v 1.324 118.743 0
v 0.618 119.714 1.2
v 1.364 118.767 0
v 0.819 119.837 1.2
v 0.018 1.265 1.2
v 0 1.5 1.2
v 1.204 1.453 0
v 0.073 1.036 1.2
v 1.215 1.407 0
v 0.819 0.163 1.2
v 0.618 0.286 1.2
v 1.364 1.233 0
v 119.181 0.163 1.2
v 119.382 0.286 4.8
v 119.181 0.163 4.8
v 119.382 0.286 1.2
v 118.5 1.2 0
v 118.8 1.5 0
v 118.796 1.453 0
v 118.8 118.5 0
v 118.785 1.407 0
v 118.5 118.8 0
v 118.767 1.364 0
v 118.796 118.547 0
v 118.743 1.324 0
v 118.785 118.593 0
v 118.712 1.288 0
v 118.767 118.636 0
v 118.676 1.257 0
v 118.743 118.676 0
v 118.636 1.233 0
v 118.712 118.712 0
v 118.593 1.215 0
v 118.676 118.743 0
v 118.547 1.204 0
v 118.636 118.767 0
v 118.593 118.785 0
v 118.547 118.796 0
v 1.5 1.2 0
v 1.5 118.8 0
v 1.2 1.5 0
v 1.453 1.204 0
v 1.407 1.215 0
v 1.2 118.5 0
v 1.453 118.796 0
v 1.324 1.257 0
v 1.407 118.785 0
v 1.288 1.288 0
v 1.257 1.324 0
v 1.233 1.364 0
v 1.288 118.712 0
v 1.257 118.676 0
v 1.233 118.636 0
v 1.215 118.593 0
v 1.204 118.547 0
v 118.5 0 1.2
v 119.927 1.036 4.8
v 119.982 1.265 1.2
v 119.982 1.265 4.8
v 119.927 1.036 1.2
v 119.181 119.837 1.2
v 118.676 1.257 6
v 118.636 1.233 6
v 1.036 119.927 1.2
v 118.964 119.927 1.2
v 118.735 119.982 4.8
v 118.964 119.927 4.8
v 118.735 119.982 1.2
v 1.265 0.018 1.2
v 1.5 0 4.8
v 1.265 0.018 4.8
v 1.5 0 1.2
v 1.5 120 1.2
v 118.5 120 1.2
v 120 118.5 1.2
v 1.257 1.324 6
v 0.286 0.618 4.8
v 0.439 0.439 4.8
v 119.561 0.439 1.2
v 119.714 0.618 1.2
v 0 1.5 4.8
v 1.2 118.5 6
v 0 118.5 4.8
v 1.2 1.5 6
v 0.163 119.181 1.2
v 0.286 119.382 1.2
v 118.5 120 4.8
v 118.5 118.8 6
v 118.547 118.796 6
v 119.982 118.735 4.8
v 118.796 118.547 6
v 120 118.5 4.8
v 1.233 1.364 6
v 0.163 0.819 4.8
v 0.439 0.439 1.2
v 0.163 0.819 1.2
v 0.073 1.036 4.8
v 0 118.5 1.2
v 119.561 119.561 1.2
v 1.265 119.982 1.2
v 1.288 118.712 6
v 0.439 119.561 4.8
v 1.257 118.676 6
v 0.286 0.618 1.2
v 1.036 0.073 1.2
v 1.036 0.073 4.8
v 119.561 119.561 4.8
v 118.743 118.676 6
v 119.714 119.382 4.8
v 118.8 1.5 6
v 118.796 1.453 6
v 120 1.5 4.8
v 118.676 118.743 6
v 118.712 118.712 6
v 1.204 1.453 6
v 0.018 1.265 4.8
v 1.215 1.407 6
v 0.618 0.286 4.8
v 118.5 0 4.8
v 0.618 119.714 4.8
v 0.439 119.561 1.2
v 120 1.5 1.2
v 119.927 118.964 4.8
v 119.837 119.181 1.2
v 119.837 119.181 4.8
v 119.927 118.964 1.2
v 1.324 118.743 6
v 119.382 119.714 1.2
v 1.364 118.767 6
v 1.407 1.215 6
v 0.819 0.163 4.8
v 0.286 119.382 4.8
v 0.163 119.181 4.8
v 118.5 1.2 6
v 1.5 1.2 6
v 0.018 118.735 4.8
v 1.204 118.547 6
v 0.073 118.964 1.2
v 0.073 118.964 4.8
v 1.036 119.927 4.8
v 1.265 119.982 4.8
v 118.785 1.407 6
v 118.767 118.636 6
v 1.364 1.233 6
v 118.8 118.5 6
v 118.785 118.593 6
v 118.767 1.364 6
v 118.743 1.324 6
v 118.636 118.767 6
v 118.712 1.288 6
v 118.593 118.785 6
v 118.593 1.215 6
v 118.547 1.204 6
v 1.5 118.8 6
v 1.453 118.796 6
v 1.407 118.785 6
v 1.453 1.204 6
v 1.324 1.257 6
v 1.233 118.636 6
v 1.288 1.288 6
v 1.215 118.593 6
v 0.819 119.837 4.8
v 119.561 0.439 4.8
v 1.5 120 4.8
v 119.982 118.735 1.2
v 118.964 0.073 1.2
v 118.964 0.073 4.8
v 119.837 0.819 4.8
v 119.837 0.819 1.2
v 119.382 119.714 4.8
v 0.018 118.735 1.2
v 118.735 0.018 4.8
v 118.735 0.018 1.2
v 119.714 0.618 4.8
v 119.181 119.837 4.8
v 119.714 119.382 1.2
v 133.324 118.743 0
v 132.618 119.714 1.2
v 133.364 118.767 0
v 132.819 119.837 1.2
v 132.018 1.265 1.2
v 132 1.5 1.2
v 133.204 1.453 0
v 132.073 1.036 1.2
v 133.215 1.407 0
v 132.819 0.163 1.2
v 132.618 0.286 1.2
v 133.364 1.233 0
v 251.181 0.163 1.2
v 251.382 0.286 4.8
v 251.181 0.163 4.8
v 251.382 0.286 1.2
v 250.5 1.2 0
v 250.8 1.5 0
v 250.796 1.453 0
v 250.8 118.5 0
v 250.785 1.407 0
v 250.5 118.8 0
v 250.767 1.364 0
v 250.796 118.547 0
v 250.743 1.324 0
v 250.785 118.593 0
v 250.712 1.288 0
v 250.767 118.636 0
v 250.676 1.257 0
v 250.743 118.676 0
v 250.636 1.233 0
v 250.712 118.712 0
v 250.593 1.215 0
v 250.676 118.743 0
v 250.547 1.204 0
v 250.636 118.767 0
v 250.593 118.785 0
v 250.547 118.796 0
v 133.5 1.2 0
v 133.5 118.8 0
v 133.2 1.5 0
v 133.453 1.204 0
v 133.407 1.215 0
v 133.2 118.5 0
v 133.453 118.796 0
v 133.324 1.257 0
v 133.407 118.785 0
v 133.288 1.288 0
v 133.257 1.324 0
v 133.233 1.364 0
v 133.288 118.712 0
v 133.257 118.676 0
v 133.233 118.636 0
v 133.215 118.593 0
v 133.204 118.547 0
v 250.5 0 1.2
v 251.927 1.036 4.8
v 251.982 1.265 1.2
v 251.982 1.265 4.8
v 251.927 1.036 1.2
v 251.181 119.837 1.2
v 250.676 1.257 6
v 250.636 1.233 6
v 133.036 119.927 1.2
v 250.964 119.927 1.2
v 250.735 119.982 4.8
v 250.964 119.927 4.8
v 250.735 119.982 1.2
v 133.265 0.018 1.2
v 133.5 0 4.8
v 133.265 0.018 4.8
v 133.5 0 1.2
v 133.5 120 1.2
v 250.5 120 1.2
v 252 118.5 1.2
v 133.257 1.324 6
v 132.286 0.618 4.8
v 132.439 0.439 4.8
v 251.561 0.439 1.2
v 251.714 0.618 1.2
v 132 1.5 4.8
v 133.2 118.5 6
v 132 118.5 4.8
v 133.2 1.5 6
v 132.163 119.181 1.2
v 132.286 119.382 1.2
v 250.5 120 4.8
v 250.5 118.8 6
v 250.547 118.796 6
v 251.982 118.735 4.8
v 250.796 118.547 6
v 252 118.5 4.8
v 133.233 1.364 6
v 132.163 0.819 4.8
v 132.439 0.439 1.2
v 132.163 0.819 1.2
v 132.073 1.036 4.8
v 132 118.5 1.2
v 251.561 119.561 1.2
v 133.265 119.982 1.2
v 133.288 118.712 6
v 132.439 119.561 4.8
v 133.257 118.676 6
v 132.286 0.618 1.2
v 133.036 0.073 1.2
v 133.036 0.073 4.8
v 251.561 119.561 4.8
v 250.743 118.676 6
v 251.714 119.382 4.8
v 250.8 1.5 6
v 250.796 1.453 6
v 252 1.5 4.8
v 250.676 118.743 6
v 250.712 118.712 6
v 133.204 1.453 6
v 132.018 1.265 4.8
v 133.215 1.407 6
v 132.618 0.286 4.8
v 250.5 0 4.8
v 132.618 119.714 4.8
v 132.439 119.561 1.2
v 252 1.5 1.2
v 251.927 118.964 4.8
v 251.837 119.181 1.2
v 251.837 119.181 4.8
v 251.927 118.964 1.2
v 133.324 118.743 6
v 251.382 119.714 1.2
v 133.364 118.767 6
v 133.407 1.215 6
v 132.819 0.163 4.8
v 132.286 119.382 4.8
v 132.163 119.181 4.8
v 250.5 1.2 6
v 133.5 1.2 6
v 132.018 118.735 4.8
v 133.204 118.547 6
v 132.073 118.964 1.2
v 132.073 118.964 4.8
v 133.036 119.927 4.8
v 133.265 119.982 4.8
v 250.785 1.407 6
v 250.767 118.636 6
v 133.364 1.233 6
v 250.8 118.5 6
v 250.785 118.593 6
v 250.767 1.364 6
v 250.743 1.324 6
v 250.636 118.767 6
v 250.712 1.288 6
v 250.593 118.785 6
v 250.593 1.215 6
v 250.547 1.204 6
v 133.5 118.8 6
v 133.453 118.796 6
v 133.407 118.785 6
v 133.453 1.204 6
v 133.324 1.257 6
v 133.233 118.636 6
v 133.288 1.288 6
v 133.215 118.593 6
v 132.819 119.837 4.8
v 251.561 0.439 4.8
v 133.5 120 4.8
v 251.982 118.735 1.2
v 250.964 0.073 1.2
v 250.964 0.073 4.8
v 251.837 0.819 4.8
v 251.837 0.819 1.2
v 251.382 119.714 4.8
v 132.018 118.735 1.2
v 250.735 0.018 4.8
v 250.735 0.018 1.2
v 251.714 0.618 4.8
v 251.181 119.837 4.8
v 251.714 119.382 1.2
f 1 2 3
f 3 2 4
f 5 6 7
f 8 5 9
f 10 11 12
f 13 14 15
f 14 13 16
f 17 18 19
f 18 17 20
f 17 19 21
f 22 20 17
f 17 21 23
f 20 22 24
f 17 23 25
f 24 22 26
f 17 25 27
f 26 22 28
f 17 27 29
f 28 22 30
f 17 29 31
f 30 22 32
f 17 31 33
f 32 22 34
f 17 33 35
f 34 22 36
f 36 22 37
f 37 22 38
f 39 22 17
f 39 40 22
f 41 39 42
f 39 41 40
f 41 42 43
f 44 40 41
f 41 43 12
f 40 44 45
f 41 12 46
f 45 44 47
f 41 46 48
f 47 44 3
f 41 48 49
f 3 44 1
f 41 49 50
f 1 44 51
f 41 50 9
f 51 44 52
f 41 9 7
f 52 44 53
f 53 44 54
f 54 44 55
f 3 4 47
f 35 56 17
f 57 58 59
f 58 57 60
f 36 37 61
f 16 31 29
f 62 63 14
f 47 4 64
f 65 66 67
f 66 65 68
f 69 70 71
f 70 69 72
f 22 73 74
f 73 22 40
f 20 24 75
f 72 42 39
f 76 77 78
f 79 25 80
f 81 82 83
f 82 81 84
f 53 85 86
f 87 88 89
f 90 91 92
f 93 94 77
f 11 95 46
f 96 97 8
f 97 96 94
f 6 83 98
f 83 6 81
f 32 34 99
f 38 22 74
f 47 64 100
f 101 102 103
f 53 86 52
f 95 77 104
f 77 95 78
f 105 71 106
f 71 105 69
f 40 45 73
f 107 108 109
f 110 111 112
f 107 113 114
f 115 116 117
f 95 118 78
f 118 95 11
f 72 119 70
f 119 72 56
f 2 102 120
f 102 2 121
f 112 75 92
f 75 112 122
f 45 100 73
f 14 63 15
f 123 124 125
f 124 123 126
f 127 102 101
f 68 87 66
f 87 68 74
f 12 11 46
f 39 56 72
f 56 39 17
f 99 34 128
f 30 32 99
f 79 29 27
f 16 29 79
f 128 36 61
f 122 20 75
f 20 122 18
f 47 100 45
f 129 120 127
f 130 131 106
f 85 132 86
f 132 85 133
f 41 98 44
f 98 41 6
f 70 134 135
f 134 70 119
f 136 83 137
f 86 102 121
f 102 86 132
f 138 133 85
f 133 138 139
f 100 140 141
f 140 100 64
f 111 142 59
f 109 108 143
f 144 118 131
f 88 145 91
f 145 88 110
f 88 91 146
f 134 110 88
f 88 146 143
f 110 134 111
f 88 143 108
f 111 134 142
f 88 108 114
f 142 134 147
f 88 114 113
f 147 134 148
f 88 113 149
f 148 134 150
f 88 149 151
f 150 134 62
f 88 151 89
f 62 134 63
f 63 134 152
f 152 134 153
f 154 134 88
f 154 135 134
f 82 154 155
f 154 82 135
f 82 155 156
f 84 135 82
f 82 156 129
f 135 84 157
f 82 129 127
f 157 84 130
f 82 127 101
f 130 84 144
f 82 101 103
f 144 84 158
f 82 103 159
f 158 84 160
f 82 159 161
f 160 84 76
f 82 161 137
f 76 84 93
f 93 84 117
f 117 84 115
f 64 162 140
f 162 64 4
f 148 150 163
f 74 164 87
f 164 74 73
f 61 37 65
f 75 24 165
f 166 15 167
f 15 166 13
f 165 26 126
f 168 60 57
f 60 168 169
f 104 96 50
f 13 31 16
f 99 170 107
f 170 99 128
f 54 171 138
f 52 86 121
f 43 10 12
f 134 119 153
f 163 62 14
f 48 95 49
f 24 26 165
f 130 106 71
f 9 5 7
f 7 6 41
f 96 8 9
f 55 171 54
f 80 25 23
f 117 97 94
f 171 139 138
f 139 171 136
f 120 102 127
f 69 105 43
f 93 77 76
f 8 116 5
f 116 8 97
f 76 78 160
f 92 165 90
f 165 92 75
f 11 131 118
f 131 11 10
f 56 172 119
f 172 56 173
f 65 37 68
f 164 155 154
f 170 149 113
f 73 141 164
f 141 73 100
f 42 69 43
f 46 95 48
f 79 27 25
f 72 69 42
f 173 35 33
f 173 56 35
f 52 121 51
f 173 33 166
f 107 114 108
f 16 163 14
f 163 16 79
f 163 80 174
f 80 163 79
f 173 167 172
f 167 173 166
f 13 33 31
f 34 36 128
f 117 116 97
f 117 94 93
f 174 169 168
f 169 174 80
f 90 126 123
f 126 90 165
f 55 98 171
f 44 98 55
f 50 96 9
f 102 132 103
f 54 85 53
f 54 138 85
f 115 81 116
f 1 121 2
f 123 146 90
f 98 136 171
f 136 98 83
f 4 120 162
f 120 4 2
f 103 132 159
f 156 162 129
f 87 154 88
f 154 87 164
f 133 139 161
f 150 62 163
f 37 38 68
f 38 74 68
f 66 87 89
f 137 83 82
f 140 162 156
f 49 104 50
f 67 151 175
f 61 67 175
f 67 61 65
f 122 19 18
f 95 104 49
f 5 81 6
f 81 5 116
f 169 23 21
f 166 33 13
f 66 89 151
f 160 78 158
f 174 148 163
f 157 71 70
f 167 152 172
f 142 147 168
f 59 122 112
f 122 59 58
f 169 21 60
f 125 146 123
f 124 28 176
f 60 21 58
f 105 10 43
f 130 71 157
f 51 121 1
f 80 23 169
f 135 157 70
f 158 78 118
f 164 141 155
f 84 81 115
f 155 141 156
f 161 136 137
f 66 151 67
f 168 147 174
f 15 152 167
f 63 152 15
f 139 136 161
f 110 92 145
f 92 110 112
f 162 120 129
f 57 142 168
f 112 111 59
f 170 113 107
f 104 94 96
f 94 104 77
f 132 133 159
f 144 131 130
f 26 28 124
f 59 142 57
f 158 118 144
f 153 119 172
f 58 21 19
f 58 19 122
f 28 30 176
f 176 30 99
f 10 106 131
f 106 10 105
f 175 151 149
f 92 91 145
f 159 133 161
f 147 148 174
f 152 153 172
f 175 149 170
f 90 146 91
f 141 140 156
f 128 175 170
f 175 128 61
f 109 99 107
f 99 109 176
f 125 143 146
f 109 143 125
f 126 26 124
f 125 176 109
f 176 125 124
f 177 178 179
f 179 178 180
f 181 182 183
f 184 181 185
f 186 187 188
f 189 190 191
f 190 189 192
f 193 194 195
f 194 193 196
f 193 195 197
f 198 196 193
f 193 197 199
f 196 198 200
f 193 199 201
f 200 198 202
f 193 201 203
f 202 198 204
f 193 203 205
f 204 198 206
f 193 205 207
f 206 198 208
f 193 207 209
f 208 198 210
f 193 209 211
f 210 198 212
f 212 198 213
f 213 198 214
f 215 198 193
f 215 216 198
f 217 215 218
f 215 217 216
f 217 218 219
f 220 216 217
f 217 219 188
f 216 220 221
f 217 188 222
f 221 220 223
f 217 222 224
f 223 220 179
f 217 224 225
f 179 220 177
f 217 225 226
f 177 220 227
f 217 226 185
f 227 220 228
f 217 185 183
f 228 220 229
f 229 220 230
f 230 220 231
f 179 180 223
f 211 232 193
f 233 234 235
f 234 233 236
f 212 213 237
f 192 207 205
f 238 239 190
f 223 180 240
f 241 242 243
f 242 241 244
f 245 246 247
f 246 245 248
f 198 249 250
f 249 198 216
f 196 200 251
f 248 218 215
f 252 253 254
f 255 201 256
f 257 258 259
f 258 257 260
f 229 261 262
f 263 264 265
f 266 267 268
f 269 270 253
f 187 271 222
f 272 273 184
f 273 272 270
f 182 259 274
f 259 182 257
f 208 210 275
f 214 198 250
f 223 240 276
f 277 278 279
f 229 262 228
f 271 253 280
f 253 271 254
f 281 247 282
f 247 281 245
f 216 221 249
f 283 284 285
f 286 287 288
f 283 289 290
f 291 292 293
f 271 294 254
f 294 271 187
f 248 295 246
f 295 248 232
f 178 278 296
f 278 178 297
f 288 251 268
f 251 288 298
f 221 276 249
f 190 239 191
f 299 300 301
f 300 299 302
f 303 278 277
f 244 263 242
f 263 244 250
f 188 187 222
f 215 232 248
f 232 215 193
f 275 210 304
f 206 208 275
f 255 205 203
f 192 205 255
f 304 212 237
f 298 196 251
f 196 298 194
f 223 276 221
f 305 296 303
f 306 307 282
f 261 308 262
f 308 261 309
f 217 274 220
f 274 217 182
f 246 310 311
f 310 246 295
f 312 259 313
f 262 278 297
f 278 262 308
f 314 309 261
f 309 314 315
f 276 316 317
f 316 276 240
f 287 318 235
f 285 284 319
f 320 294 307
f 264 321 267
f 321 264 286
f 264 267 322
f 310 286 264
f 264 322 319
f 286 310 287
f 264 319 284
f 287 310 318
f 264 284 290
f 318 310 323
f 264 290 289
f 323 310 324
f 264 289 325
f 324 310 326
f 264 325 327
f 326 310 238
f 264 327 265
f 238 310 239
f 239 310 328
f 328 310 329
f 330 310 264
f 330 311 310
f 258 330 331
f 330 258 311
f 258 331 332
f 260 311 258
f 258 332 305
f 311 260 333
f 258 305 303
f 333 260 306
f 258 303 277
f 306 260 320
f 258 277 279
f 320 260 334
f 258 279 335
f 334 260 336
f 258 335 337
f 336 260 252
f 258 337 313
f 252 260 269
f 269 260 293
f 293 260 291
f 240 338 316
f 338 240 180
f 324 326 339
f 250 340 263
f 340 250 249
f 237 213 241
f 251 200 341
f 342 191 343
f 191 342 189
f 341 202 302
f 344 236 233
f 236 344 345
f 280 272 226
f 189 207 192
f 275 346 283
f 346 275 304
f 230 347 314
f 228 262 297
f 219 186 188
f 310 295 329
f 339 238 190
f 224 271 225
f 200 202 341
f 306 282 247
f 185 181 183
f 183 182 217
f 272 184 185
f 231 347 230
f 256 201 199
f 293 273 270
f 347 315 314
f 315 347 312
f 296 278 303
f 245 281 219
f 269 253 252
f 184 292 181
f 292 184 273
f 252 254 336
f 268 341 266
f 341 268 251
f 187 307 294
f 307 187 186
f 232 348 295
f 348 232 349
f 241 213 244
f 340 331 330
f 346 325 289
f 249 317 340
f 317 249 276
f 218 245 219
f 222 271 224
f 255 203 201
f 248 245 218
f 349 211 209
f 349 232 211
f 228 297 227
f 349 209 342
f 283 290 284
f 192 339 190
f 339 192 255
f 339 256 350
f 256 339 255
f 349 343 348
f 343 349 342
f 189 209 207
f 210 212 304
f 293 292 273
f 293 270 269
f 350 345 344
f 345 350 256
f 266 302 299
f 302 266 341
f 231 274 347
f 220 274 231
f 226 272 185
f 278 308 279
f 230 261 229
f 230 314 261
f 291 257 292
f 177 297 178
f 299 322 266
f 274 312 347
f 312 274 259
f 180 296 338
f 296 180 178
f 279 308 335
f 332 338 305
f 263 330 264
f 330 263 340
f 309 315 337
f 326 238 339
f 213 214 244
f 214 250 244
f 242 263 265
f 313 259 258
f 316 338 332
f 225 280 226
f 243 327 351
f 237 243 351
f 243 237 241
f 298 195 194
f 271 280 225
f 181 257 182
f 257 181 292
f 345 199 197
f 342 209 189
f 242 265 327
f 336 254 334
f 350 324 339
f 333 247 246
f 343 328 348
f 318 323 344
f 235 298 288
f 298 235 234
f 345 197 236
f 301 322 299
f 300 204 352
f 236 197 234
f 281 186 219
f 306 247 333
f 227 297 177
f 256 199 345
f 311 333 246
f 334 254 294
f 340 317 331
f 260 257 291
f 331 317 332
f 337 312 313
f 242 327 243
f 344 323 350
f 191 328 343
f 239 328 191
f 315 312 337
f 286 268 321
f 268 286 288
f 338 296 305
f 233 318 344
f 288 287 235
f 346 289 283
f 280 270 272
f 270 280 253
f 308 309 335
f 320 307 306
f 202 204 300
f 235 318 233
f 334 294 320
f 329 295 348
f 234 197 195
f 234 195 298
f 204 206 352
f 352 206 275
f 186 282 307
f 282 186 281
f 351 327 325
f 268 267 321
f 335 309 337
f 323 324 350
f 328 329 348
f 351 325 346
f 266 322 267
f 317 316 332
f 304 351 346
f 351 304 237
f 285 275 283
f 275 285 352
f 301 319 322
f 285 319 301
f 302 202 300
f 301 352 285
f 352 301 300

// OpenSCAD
// file: ../lib/maker_mark.scad
// SPDX-License-Identifier: MIT
// Copyright (c) 2026 KomaSCAD contributors. https://github.com/Kazutadashi/koma-scad
//
// The maker's mark (銘) of the ban, komadai and komabako. Include this file:
//     include <../lib/maker_mark.scad>
// A mark is up to three parts, stacked and centered: an emblem (a koma with a
// character on it), a main line, and a smaller second line. Each line can
// have wide letter spacing, as in a wordmark.
//
// Sizes: size_1 is the main line's text size and size_2 the second line's,
// in mm. maker_mark_sizes() picks them: as large as the room allows, with no
// text below a printable minimum (min_size).

// The emblem's proportions: a koma 1.6 times the main text size tall, as
// wide as a shogi king is for its length.
mark_emblem_height = 1.6;      // times the main text size
mark_emblem_aspect = 0.89;     // width / height
mark_emblem_shoulder = 0.72;   // the shoulders, as a fraction of the height
mark_emblem_inset = 0.37;      // the half-width at the shoulders, as a fraction of the height
mark_emblem_character = 0.5;   // the character's size, as a fraction of the emblem's height
mark_line_gap = 0.55;          // space between the parts, times the main text size
mark_fill = 0.8;               // an automatic mark uses at most this much of its room

// The approximate width of one character, in text sizes. Text has no
// measured width in OpenSCAD 2021, so the mark's size is planned from these.
// OpenSCAD's text size is about the height of a capital, so a character is
// wider than its size: measured in Shippori Mincho and Kaisei Tokumin, a
// Japanese character (from U+2E80) is about 1.35 wide and 1.3 tall, a Latin
// capital about 1 wide (up to 1.2), lower case 0.75, a space 0.35.
function mark_character_width(character) =
    let(code = ord(character))
    code >= 11904 ? 1.35
    : character == " " ? 0.35
    : code >= 65 && code <= 90 ? 1
    : code >= 97 && code <= 122 ? 0.75
    : 0.5;
function mark_text_width(line, i=0) = i >= len(line) ? 0 : mark_character_width(line[i]) + mark_text_width(line, i + 1);
function maker_mark_has_kanji(line) = len([for (character = line) if (ord(character) >= 11904) 1]) > 0;
// The height of a line, in text sizes: taller with Japanese characters.
function mark_line_height(line) = maker_mark_has_kanji(line) ? 1.35 : 1.1;

// The emblem's height: 1.6 times the main text size, but tall enough that its
// character is at least min_size.
function mark_emblem_size(size_1, min_size) = max(size_1*mark_emblem_height, min_size/mark_emblem_character);

// A koma outline, its heel on y = 0 and centered on x = 0.
module mark_koma_2d(height) {
    half = height*mark_emblem_aspect/2;
    polygon([[-half, 0], [half, 0], [height*mark_emblem_inset, height*mark_emblem_shoulder],
             [0, height], [-height*mark_emblem_inset, height*mark_emblem_shoulder]]);
}

// The 2D mark, centered on the origin at the middle of the main line's
// baseline. Empty lines are left out. stroke thickens every stroke by that
// much on each side, so that thin strokes print. min_size keeps the emblem's
// character at least that size.
module maker_mark_2d(line_1, line_2, size_1, size_2, font_1, font_2, spacing_1=1, spacing_2=1,
                     emblem=false, emblem_character="", emblem_font="", stroke=0, min_size=0) {
    gap = size_1*mark_line_gap;
    if (line_1 != "")
        offset(delta=stroke)
            text(line_1, size=size_1, font=font_1, spacing=spacing_1, halign="center", valign="baseline");
    if (line_2 != "")
        translate([0, -gap]) offset(delta=stroke)
            text(line_2, size=size_2, font=font_2, spacing=spacing_2, halign="center", valign="top");
    if (emblem) {
        height = mark_emblem_size(size_1, min_size);
        // The main line's capitals stand about one text size above the baseline.
        translate([0, size_1 + gap]) difference() {
            mark_koma_2d(height);
            if (emblem_character != "")
                translate([0, height*0.42]) offset(delta=stroke)
                    text(emblem_character, size=height*mark_emblem_character,
                         font=emblem_font == "" ? font_1 : emblem_font, halign="center", valign="center");
        }
    }
}

// The space above and below the main line's baseline. Letters stand about
// 1.1 sizes above it and reach about 0.2 below.
function mark_above(size_1, emblem, min_size=0) =
    size_1*1.1 + (emblem ? size_1*mark_line_gap + mark_emblem_size(size_1, min_size) : 0);
function mark_below(line_2, size_1, size_2) =
    size_1*0.2 + (line_2 == "" ? 0 : size_1*mark_line_gap + size_2*mark_line_height(line_2));

// The same mark, with its whole height centered on the origin.
module maker_mark_centered_2d(line_1, line_2, size_1, size_2, font_1, font_2, spacing_1=1, spacing_2=1,
                              emblem=false, emblem_character="", emblem_font="", stroke=0, min_size=0) {
    translate([0, (mark_below(line_2, size_1, size_2) - mark_above(size_1, emblem, min_size))/2])
        maker_mark_2d(line_1, line_2, size_1, size_2, font_1, font_2, spacing_1, spacing_2,
                      emblem, emblem_character, emblem_font, stroke, min_size);
}

// The mark's approximate [width, height] in mm, for fit checks.
function maker_mark_extent(line_1, line_2, size_1, size_2, spacing_1=1, spacing_2=1, emblem=false, min_size=0) =
    [max(mark_text_width(line_1)*size_1*spacing_1, mark_text_width(line_2)*size_2*spacing_2,
         emblem ? mark_emblem_size(size_1, min_size)*mark_emblem_aspect : 0),
     mark_above(size_1, emblem, min_size) + mark_below(line_2, size_1, size_2)];

// The text sizes [size_1, size_2] of a mark. size > 0 sets the main line;
// size = 0 makes it as large as fits mark_fill of room ([width, depth]), up to
// max_size. The second line is ratio times the main line, but never smaller
// than min_size.
function maker_mark_sizes(line_1, line_2, size, ratio, min_size, max_size, spacing_1, spacing_2, emblem, room) =
    let(width_1 = mark_text_width(line_1)*spacing_1,
        width_2 = mark_text_width(line_2)*spacing_2*ratio,
        height = 1.3 + (emblem ? mark_line_gap + mark_emblem_height : 0)
                 + (line_2 == "" ? 0 : mark_line_gap + ratio*mark_line_height(line_2)),
        by_width = room[0]*mark_fill/max(width_1, width_2, emblem ? mark_emblem_height*mark_emblem_aspect : 0, 0.01),
        by_height = room[1]*mark_fill/height,
        size_1 = size > 0 ? size : min(max_size, by_width, by_height),
        size_2 = max(size_1*ratio, min_size))
    [size_1, size_2];

// The size of the smallest text in the lines, or a large number when both are
// empty. The emblem's character grows to min_size by itself.
function maker_mark_smallest_text(line_1, line_2, sizes) =
    min(concat(line_1 != "" ? [sizes[0]] : [], line_2 != "" ? [sizes[1]] : [], [1000]));
// file: ../lib/shapes.scad
// SPDX-License-Identifier: MIT
// Copyright (c) 2026 KomaSCAD contributors. https://github.com/Kazutadashi/koma-scad
//
// Rounded slabs and rings for the ban, komadai and komabako. Include this file:
//     include <../lib/shapes.scad>
// Every shape starts at the origin and grows into +x, +y and +z.

// A rectangle with rounded corners. The radius is limited to half the shorter side.
module rounded_rectangle_2d(size, radius) {
    assert(min(size) > 0, "A rounded rectangle needs a positive width and depth.");
    assert(radius >= 0, "A corner radius cannot be negative.");
    corner = min(radius, min(size)/2);
    if (corner == 0) square(size);
    else translate([corner, corner]) offset(r=corner) square([size[0] - 2*corner, size[1] - 2*corner]);
}

// A slab with rounded vertical corners. size is [width, depth, height].
module rounded_slab(size, radius) {
    assert(size[2] > 0, "A rounded slab needs a positive height.");
    linear_extrude(size[2]) rounded_rectangle_2d([size[0], size[1]], radius);
}

// A rounded slab with a 45 degree chamfer (面取り) round its bottom and top
// edges. A chamfer prints without supports on the bed side of a part.
module chamfered_slab(size, radius, bottom=0, top=0) {
    assert(bottom + top < size[2], "The chamfers are taller than the slab.");
    module layer(z, inset, height) {
        translate([inset, inset, z])
            rounded_slab([size[0] - 2*inset, size[1] - 2*inset, height], max(0, radius - inset));
    }
    thin = 0.01;
    hull() {
        layer(0, bottom, thin);
        layer(bottom, 0, size[2] - bottom - top);
        layer(size[2] - thin, top, thin);
    }
}

// The band between a rounded rectangle and the same shape wall mm smaller on each side.
module rounded_ring_2d(size, wall, radius) {
    assert(wall > 0 && 2*wall < min(size), "The ring wall does not fit inside the ring.");
    difference() {
        rounded_rectangle_2d(size, radius);
        translate([wall, wall]) rounded_rectangle_2d([size[0] - 2*wall, size[1] - 2*wall], max(0, radius - wall));
    }
}
// file: ../lib/filaments.scad
// SPDX-License-Identifier: MIT
// Copyright (c) 2026 KomaSCAD contributors. https://github.com/Kazutadashi/koma-scad
//
// The named filaments of every module. Include this file:
//     include <../lib/filaments.scad>
// A Customizer list of filaments must name these entries, and can add Custom.

// [name, [red, green, blue, opacity]], each channel from 0 to 1.
filament_palette = [
    ["Wood", [0.76, 0.58, 0.34, 1]],   ["Black", [0.08, 0.06, 0.04, 1]],
    ["White", [0.95, 0.95, 0.95, 1]],  ["Red", [0.65, 0.05, 0.04, 1]],
    ["Blue", [0.08, 0.25, 0.8, 1]],    ["Green", [0.08, 0.5, 0.2, 1]],
    ["Purple", [0.45, 0.15, 0.65, 1]], ["Yellow", [0.95, 0.8, 0.08, 1]],
    ["Orange", [0.95, 0.35, 0.05, 1]], ["Silver", [0.7, 0.72, 0.75, 1]],
    ["Gold", [0.8, 0.62, 0.2, 1]],     ["Glitter silver", [0.7, 0.72, 0.75, 1]],
    ["Glitter gold", [0.8, 0.62, 0.2, 1]],
    ["Filament 1", [0.5, 0.5, 0.5, 1]], ["Filament 2", [0.15, 0.5, 0.85, 1]], ["Filament 3", [0.85, 0.25, 0.5, 1]],
    // The colors of the traditional woods: kaya (榧) for boards and komadai, island
    // mulberry (桑) and black persimmon (黒柿) for boxes. Colors only: no grain.
    ["Kaya", [0.86, 0.72, 0.47, 1]],   ["Kuwa", [0.66, 0.45, 0.23, 1]],
    ["Kurogaki", [0.23, 0.18, 0.14, 1]]
];

// The color of a named filament. Custom gives custom_rgba.
function filament_rgba(name, custom_rgba) =
    let(found = [for (entry = filament_palette) if (entry[0] == name) entry[1]])
    name == "Custom" ? custom_rgba
    : assert(len(found) == 1, str("Unknown filament: ", name)) found[0];
// main file
// SPDX-License-Identifier: MIT
// Copyright (c) 2026 KomaSCAD contributors. https://github.com/Kazutadashi/koma-scad
//
// KomaSCAD komadai: a stand for captured pieces. Tested with OpenSCAD 2021.01.
// The default settings make a pair of flat komadai for a 12 mm tabletop board.
// Units are mm unless a comment says otherwise.
// Guide and every setting: docs/komadai.md.
// Keep ../lib/ next to this file's folder.

/* [01 - Start here] */
// Display shows the pair standing, as on the table. One to print and Pair to print turn them top face down for the bed.
Output_Mode = "Display"; // [Display,One to print,Pair to print]
// Flat: a plate beside a tabletop board. Yagura: a top on four legs. One leg: a top on a column and foot. Use the legged styles beside a legged board.
Table_Style = "Flat"; // [Flat,Yagura,One leg]

/* [02 - Board and pieces] */
// mm. Height of the board's playing surface above the table. 12 = the bundled tabletop board.
Board_Surface_Height = 12; // [4:0.5:400]
// mm. Yagura and One leg: how far the top sits below the playing surface. Tradition: 10 to 20.
Height_Below_Board = 15; // [5:0.5:40]
// mm. Length of the largest piece, from the heel to the point. The automatic top size follows it.
Piece_Length = 32; // [10:0.1:100]
// mm. Width of the largest piece at the heel.
Base_Width = 28.5; // [10:0.1:100]

/* [03 - Top] */
// mm. Width of the top. 0 = automatic: about 120 for the bundled pieces.
Top_Width = 0; // [0:1:300]
// mm. Depth of the top. 0 = automatic.
Top_Depth = 0; // [0:1:300]
// mm. Flat only: thickness of the plate. Keep it below the board surface.
Flat_Thickness = 6; // [2:0.5:40]
// mm. Yagura and One leg: thickness of the top.
Top_Thickness = 12; // [4:0.5:40]
// mm. Radius of the four corners.
Corner_Radius = 1.5; // [0:0.5:20]
// mm. 45 degree chamfer (面取り) round the top and bottom edges of the top.
Edge_Chamfer = 1.2; // [0:0.1:4]
// A thin groove inside the edge of the top. Tradition: plain.
Surface_Border_Groove = false;
// mm. Distance from the edge to the groove.
Groove_Inset = 7; // [2:0.5:20]
// mm. Width of the groove.
Groove_Width = 0.9; // [0.3:0.1:2]
// mm. Depth of the groove.
Groove_Depth = 0.4; // [0.1:0.1:1.5]

/* [04 - Legs] */
// mm. Yagura: width of each square leg at the top.
Leg_Width = 16; // [8:0.5:40]
// Yagura: width of each leg at the foot, as a fraction of its width at the top.
Leg_Taper = 0.85; // [0.5:0.01:1]
// mm. Yagura: distance from the edge of the top to each leg.
Leg_Inset = 8; // [0:0.5:40]
// Yagura: stretchers (貫, nuki) that tie the legs together near the foot. They make the stand stiffer.
Stretchers = true;
// mm. Yagura: height of the stretchers above the table.
Stretcher_Height = 30; // [5:1:200]
// One leg: width of the column under the top, as a fraction of the top.
Column_Top_Ratio = 0.3; // [0.15:0.01:0.6]
// One leg: width of the column at the foot, as a fraction of the top.
Column_Bottom_Ratio = 0.36; // [0.15:0.01:0.6]
// One leg: width of the foot, as a fraction of the top.
Foot_Size_Ratio = 0.8; // [0.4:0.01:1]
// mm. One leg: thickness of the foot plate.
Foot_Thickness = 8; // [3:0.5:20]

/* [05 - Maker's mark] */
// The main line of the mark (銘), cut into the underside of the top: your name or brand. Empty = no mark.
Mark_Line_1 = "";
// A smaller line under it, such as SHOGI · 将棋. Empty = none.
Mark_Line_2 = "";
// mm. Text size of the main line. The second line and the emblem follow it. 0 = automatic: as large as the room allows, up to Mark Max Size.
Mark_Size = 0; // [0:0.1:40]
// mm. Automatic only: the largest text size of the main line.
Mark_Max_Size = 14; // [4:0.5:40]
// Size of the second line, as a fraction of the main line. Keep Japanese characters 3 mm or larger.
Mark_Line_2_Ratio = 0.42; // [0.2:0.01:1]
// mm. Smallest size of any text in the mark, and of the emblem's character, so that it prints. The second line and the emblem grow to it. See docs/makers-mark.md for measured values.
Mark_Min_Text_Size = 7; // [3:0.5:20]
// mm. Thickens every stroke of the mark by this much on each side, so that thin strokes print. 0.12 for a thin Mincho.
Mark_Stroke = 0; // [0:0.01:0.3]
// Letter spacing of the main line: each letter's width times this. Raise it if letters run together: a gap narrower than one printed line does not print, and the letters merge. 1.1 clears it for most fonts. About 1.7 gives a wide-spaced wordmark.
Mark_Spacing_1 = 1.1; // [0.8:0.05:3]
// Letter spacing of the second line. Raise it if letters run together.
Mark_Spacing_2 = 1.1; // [0.8:0.05:3]
// An installed font for the main line. Find its exact name in Help > Font List.
Mark_Font_1 = "Kaisei Tokumin:style=ExtraBold";
// An installed font for the second line. Use one with Japanese characters for Japanese text.
Mark_Font_2 = "Kaisei Tokumin:style=ExtraBold";
// A koma above the text, with a character cut into it.
Mark_Emblem = false;
// The character on the emblem, such as 王.
Mark_Emblem_Character = "";
// An installed font for the emblem's character, such as a brush font. Empty = Mark Font 1.
Mark_Emblem_Font = "";
// mm. Depth of the mark.
Mark_Depth = 0.4; // [0.2:0.1:1]

/* [06 - Filament color and layout] */
// Color. Kaya matches the bundled board. Custom uses Komadai Color.
Komadai_Filament = "Kaya"; // [Kaya,Kuwa,Kurogaki,Wood,Black,White,Red,Blue,Green,Purple,Yellow,Orange,Silver,Gold,Glitter silver,Glitter gold,Filament 1,Filament 2,Filament 3,Custom]
// [red, green, blue, opacity], 0 to 1. Used when Komadai Filament is Custom.
Komadai_Color = [0.74, 0.5, 0.24, 1];
// mm. Space between the two komadai of a pair.
Pair_Gap = 12; // [3:1:30]
// mm. The tallest part your printer can make. A legged komadai prints in one piece, top face down.
Print_Height = 256; // [100:1:1000]

/* [Hidden] */
version = "3.5";   // the same as VERSION in komascad.py; a test checks this
$fn = 40;
epsilon = 0.02;   // overlap that keeps boolean operations clean

include <../lib/filaments.scad>
include <../lib/shapes.scad>
include <../lib/maker_mark.scad>


// ===== 1. Sizes ===============================================================
// The komadai stands with its underside at z = 0 and its top face up.

// A traditional top is about 12 cm square: room for a few rows of captured pieces.
automatic_top = max(Base_Width*4.2, Piece_Length*3.75);
top_width = Top_Width > 0 ? Top_Width : automatic_top;
top_depth = Top_Depth > 0 ? Top_Depth : automatic_top;
flat = Table_Style == "Flat";
// A legged komadai sits a little below the playing surface, so that the
// captured pieces sit at or below the pieces on the board.
overall_height = flat ? Flat_Thickness : Board_Surface_Height - Height_Below_Board;
top_thickness = flat ? Flat_Thickness : Top_Thickness;
leg_height = overall_height - top_thickness;



// The room for the mark under the top, clear of the legs or the column.
column_top = top_width*Column_Top_Ratio;
mark_room = Table_Style == "Yagura" ? [top_width, top_depth] - 2*[Leg_Inset + Leg_Width + 2, Leg_Inset + Leg_Width + 2]
    : Table_Style == "One leg" ? [top_width - 2*Edge_Chamfer - 6, (top_depth - column_top)/2 - 6]
    : [top_width, top_depth] - 2*[Edge_Chamfer + 3, Edge_Chamfer + 3];

// The maker's mark, from lib/maker_mark.scad: its text sizes, as large as its
// room allows, and no text below Mark Min Text Size.
mark_on = Mark_Line_1 != "" || Mark_Line_2 != "" || Mark_Emblem;
mark_sizes = maker_mark_sizes(Mark_Line_1, Mark_Line_2, Mark_Size, Mark_Line_2_Ratio, Mark_Min_Text_Size,
                              Mark_Max_Size, Mark_Spacing_1, Mark_Spacing_2, Mark_Emblem, mark_room);
mark_extent = maker_mark_extent(Mark_Line_1, Mark_Line_2, mark_sizes[0], mark_sizes[1], Mark_Spacing_1,
                                Mark_Spacing_2, Mark_Emblem, Mark_Min_Text_Size);
mark_smallest_text = maker_mark_smallest_text(Mark_Line_1, Mark_Line_2, mark_sizes);
module mark_2d() {
    maker_mark_centered_2d(Mark_Line_1, Mark_Line_2, mark_sizes[0], mark_sizes[1], Mark_Font_1, Mark_Font_2,
                           Mark_Spacing_1, Mark_Spacing_2, Mark_Emblem, Mark_Emblem_Character, Mark_Emblem_Font,
                           Mark_Stroke, Mark_Min_Text_Size);
}


// ===== 2. The komadai =========================================================

// The mark under the top, mirrored so that it reads from below. On a One leg
// komadai it goes beside the column, toward the front.
module signature_cut() {
    one_leg_offset = Table_Style == "One leg" ? -(column_top + top_depth)/4 : 0;
    if (mark_on)
        translate([top_width/2, top_depth/2 + one_leg_offset, -epsilon]) linear_extrude(Mark_Depth + epsilon, convexity=20)
            mirror([1, 0, 0]) mark_2d();
}

module top() {
    translate([0, 0, overall_height - top_thickness]) difference() {
        chamfered_slab([top_width, top_depth, top_thickness], Corner_Radius, Edge_Chamfer, Edge_Chamfer);
        signature_cut();
        if (Surface_Border_Groove)
            translate([Groove_Inset, Groove_Inset, top_thickness - Groove_Depth]) linear_extrude(Groove_Depth + epsilon)
                rounded_ring_2d([top_width - 2*Groove_Inset, top_depth - 2*Groove_Inset], Groove_Width,
                                max(0, Corner_Radius - Groove_Inset/2));
    }
}

// Four square legs that taper toward the foot.
module yagura_legs() {
    for (x = [Leg_Inset, top_width - Leg_Inset - Leg_Width], y = [Leg_Inset, top_depth - Leg_Inset - Leg_Width])
        translate([x + Leg_Width/2, y + Leg_Width/2, 0])
            linear_extrude(leg_height + epsilon, scale=1/Leg_Taper)
                square(Leg_Width*Leg_Taper, center=true);
}

// The stretchers: one beam between each pair of neighboring legs. The top of
// each beam is a 45 degree ridge, so that it grows out of the legs without
// supports when the komadai prints top face down.
module stretchers() {
    beam = Leg_Width*0.45;
    near = Leg_Inset + Leg_Width/2;
    // One beam along +x from the origin, its bottom at z = 0.
    module beam_along_x(length) {
        // Takes the profile's x across the beam (to y) and its y up (to z).
        multmatrix([[0, 0, 1, 0], [1, 0, 0, 0], [0, 1, 0, 0], [0, 0, 0, 1]]) linear_extrude(length)
            polygon([[-beam/2, 0], [beam/2, 0], [beam/2, beam], [0, 1.5*beam], [-beam/2, beam]]);
    }
    for (y = [near, top_depth - near])
        translate([near, y, Stretcher_Height]) beam_along_x(top_width - 2*near);
    for (x = [near, top_width - near])
        translate([x, near, Stretcher_Height]) rotate([0, 0, 90]) beam_along_x(top_depth - 2*near);
}

// A tapered column on a foot plate. The column meets the foot with a 45
// degree flare, so that the foot prints without supports when the komadai
// prints top face down.
module one_leg() {
    center = [top_width/2, top_depth/2];
    column_bottom = top_width*Column_Bottom_Ratio;
    column_top = top_width*Column_Top_Ratio;
    foot = [top_width, top_depth]*Foot_Size_Ratio;
    flare = (min(foot) - column_bottom)/2;

    translate([center[0] - foot[0]/2, center[1] - foot[1]/2, 0])
        chamfered_slab([foot[0], foot[1], Foot_Thickness], Corner_Radius, Edge_Chamfer, 0);
    hull() {
        translate([center[0], center[1], Foot_Thickness - epsilon]) linear_extrude(epsilon)
            square([foot[0] - 2*Edge_Chamfer, foot[1] - 2*Edge_Chamfer], center=true);
        translate([center[0], center[1], Foot_Thickness + flare]) linear_extrude(epsilon)
            square(column_bottom, center=true);
    }
    translate([center[0], center[1], Foot_Thickness + flare])
        linear_extrude(leg_height - Foot_Thickness - flare + epsilon, scale=column_top/column_bottom)
            square(column_bottom, center=true);
}

module komadai() {
    top();
    if (Table_Style == "Yagura") yagura_legs();
    if (Table_Style == "Yagura" && Stretchers) stretchers();
    if (Table_Style == "One leg") one_leg();
}

// Turns the komadai over, top face down, for the smoothest top.
module on_bed() { translate([0, top_depth, overall_height]) rotate([180, 0, 0]) children(); }


// ===== 3. Checks ==============================================================

assert(top_width > 2*Base_Width && top_depth > 2*Piece_Length,
    "The top must hold more than one piece in each direction. Raise Top Width and Top Depth, or set them to 0.");
assert(!flat || Flat_Thickness < Board_Surface_Height,
    "A flat komadai must be lower than the playing surface. Reduce Flat Thickness.");
assert(flat || leg_height > 10,
    str("A ", Table_Style, " komadai needs Board Surface Height at least ", Top_Thickness + Height_Below_Board + 10,
        " mm: the height of your legged board's playing surface above the table."));
assert(Output_Mode == "Display" || overall_height <= Print_Height,
    str("The komadai is ", overall_height, " mm tall, more than the ", Print_Height, " mm that your printer can make. ",
        "A taller printer is needed for this board."));
assert(Table_Style != "Yagura" || !Stretchers || Stretcher_Height + 1.5*Leg_Width*0.45 < leg_height,
    "The stretchers are higher than the legs. Lower Stretcher Height.");
assert(2*Edge_Chamfer < top_thickness, "Edge Chamfer is too large for the top.");
assert(!mark_on || Mark_Depth < top_thickness/2, "The mark is too deep for the top. Reduce Mark Depth.");
assert(!mark_on || (mark_extent[0] < mark_room[0] && mark_extent[1] < mark_room[1]),
    str("The maker's mark (about ", mark_extent[0], " x ", mark_extent[1], " mm) does not fit under the top (",
        mark_room[0], " x ", mark_room[1], " mm). Set Mark Size to 0 (automatic), reduce the letter spacing, or shorten the lines."));
assert(!mark_on || mark_smallest_text >= Mark_Min_Text_Size - 0.001,
    str("The maker's mark text would be ", round(mark_smallest_text*10)/10, " mm, smaller than Mark Min Text Size (",
        Mark_Min_Text_Size, " mm), and would not print. Set Mark Size to 0 (automatic) or larger, ",
        "reduce the letter spacing, or shorten the main line."));
assert(!Surface_Border_Groove || (Groove_Depth < top_thickness && 2*Groove_Inset < min(top_width, top_depth)),
    "The groove does not fit on the top. Change Groove Inset or Groove Depth.");
assert(Table_Style != "Yagura" || 2*(Leg_Inset + Leg_Width) < min(top_width, top_depth),
    "The legs do not fit under the top. Reduce Leg Width or Leg Inset.");
assert(Table_Style != "One leg" || leg_height > Foot_Thickness + (min(top_width, top_depth)*(Foot_Size_Ratio - Column_Bottom_Ratio))/2,
    "The column is too short for the foot and its flare. Raise Board Surface Height, or reduce Foot Size Ratio.");

// Information in the Console.
if (mark_on)
    echo(str("Maker's mark: about ", round(mark_extent[0]), " x ", round(mark_extent[1]), " mm. Main line ",
             round(mark_sizes[0]*10)/10, " mm, second line ", round(mark_sizes[1]*10)/10, " mm."));
echo(str("KomaSCAD komadai ", version, ". ", Table_Style, ". Top: ", top_width, " x ", top_depth,
         " mm. Height: ", overall_height, " mm, ", Board_Surface_Height - overall_height, " mm below the board."));


// ===== 4. Output ==============================================================

color(filament_rgba(Komadai_Filament, Komadai_Color)) {
    if (Output_Mode == "One to print") on_bed() komadai();
    else if (Output_Mode == "Pair to print") {
        on_bed() komadai();
        translate([top_width + Pair_Gap, 0, 0]) on_bed() komadai();
    }
    else {
        komadai();
        translate([top_width + Pair_Gap, 0, 0]) komadai();
    }
}
